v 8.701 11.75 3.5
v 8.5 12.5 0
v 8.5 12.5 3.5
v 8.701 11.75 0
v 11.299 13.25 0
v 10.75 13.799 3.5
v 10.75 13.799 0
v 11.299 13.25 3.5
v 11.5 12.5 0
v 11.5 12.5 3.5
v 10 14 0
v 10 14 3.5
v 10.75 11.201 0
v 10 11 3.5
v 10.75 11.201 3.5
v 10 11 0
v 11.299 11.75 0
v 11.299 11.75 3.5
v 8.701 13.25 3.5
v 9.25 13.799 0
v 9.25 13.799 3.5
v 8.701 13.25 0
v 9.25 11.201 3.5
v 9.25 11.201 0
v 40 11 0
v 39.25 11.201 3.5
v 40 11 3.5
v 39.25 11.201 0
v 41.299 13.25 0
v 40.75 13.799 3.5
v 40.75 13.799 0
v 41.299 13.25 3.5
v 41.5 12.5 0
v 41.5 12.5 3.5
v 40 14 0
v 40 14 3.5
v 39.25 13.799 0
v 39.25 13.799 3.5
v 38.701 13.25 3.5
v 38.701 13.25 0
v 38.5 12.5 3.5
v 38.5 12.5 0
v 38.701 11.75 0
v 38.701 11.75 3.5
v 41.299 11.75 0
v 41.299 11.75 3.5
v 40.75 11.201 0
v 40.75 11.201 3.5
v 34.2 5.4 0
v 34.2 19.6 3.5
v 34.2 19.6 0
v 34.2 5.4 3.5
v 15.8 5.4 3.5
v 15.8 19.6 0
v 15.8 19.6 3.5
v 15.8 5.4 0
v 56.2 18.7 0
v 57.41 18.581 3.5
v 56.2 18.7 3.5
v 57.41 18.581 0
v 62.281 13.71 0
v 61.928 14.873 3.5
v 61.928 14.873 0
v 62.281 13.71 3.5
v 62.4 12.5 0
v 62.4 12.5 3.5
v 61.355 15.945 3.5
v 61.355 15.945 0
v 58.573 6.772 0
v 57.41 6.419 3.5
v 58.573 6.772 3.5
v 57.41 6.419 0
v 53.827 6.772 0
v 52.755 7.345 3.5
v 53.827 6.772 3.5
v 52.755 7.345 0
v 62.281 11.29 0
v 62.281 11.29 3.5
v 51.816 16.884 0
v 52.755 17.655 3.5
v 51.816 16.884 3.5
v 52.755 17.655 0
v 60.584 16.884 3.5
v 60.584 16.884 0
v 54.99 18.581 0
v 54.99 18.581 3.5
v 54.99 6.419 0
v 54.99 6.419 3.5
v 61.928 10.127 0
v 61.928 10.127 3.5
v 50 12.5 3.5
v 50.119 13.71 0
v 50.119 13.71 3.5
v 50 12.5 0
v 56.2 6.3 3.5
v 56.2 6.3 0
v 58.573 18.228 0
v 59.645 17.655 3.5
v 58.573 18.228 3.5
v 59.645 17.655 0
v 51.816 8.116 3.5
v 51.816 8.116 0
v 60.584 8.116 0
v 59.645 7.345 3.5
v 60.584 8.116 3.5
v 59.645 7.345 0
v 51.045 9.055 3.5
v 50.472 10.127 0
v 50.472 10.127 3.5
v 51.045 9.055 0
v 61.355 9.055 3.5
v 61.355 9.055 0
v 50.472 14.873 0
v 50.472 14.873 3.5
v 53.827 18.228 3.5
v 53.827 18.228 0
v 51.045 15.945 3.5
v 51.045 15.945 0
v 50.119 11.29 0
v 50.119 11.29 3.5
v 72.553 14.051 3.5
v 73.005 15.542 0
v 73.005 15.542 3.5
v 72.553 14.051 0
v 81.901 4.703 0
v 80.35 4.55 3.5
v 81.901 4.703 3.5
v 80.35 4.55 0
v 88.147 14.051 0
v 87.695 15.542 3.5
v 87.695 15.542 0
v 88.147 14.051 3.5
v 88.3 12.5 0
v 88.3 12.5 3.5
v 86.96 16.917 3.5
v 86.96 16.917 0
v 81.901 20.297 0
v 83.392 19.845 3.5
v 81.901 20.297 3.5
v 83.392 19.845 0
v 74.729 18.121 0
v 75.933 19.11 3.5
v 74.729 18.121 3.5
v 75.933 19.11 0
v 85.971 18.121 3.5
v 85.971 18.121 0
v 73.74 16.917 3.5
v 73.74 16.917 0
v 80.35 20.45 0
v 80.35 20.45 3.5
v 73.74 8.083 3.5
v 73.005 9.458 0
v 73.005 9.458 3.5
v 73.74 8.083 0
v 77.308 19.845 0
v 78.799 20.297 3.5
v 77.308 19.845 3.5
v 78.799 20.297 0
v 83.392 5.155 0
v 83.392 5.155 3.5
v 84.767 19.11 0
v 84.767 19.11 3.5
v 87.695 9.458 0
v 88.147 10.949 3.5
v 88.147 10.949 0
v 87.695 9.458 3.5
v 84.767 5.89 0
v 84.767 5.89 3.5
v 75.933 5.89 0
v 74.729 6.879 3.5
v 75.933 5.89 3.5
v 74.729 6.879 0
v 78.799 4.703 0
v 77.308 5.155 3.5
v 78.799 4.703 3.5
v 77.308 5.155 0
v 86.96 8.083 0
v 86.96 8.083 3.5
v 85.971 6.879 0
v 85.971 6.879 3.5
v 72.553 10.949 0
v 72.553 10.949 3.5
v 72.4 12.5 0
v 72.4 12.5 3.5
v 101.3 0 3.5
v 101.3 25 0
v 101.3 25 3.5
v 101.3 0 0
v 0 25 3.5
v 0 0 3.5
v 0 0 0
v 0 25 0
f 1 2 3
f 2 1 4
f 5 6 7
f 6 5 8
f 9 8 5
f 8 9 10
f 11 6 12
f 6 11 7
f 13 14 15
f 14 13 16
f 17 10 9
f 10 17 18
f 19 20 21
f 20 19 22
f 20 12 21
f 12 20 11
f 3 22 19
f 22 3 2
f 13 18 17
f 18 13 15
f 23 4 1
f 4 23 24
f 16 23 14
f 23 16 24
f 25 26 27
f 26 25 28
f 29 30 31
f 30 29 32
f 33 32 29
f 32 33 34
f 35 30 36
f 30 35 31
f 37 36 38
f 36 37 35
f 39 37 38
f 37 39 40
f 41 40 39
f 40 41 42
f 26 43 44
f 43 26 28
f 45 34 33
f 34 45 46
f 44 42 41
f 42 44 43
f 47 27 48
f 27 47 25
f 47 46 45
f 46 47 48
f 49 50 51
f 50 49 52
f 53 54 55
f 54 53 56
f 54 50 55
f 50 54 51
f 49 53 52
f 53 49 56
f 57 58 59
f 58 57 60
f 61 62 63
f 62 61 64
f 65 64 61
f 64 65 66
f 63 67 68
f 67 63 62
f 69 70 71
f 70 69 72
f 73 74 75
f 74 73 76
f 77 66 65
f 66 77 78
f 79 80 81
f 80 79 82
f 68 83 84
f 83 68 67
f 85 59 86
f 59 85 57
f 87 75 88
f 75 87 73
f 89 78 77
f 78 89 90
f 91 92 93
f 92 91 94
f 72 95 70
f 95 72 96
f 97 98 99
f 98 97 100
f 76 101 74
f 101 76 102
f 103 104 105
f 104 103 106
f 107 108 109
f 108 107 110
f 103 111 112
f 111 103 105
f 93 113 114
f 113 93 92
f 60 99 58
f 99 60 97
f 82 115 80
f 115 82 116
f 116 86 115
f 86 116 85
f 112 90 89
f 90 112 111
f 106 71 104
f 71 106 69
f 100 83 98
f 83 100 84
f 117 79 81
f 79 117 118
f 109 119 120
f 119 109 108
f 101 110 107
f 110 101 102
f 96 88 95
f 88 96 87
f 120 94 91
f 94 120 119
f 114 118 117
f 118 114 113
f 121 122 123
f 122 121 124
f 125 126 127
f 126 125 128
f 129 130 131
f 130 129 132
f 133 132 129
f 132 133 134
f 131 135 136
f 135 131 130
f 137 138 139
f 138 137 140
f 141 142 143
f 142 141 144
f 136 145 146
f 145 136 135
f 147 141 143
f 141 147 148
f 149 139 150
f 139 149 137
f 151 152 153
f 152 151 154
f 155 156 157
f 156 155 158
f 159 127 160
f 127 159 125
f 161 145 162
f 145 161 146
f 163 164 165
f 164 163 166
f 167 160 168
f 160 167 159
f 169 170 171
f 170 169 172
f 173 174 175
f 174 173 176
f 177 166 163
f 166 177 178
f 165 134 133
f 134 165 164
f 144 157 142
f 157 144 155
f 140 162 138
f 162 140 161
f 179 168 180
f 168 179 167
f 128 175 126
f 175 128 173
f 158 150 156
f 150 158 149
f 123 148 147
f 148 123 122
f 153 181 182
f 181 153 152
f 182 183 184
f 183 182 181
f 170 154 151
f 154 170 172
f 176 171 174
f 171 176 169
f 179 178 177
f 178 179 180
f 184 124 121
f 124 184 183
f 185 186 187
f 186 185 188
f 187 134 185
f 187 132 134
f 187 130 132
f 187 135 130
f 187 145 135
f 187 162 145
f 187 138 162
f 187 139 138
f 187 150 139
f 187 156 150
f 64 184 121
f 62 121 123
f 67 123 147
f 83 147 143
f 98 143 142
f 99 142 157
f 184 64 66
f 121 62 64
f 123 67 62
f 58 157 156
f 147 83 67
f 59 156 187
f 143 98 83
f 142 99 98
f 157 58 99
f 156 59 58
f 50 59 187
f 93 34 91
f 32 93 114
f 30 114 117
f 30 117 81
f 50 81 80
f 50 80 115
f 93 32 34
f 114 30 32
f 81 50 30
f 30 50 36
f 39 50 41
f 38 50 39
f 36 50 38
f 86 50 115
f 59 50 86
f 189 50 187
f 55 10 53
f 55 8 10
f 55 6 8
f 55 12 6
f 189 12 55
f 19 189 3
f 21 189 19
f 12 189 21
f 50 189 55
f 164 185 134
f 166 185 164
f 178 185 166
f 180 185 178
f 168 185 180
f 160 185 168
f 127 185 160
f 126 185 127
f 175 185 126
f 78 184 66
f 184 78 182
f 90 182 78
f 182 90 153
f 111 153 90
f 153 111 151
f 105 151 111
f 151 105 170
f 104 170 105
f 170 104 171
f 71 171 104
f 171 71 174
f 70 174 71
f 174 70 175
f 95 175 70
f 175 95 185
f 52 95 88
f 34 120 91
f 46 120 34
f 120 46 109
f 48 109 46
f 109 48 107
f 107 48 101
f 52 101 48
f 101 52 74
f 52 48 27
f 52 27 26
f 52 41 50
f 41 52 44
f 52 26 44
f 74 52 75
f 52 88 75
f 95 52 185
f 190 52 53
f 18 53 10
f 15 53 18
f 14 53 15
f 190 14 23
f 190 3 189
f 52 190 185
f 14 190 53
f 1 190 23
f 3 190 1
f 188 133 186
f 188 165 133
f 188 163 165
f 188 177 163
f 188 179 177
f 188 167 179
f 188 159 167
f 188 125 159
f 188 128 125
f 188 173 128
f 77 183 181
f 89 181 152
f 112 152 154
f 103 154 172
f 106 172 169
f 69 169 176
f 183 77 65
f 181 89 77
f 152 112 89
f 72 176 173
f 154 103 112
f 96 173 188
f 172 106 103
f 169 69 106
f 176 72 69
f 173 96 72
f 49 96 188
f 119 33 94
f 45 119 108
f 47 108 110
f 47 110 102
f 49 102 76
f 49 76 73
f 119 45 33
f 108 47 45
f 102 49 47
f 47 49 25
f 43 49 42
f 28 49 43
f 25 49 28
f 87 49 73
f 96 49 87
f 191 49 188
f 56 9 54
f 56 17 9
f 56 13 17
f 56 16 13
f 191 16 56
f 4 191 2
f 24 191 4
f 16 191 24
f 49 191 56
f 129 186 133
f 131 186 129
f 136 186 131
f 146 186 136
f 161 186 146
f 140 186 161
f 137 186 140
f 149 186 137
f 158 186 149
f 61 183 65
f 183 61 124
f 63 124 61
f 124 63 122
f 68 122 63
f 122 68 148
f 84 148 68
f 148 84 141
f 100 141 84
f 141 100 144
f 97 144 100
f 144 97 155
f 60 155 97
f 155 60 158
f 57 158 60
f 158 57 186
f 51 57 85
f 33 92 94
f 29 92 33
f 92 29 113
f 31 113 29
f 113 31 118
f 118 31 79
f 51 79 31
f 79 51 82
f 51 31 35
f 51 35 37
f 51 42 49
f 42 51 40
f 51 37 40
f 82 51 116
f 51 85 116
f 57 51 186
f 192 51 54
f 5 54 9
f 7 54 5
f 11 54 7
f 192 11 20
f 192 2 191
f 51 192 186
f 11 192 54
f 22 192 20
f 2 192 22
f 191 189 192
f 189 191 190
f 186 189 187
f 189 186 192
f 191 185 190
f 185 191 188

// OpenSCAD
button_dia = 15.9;
power_dia = 12.4;
usb_screw_dia = 3;
usb_screw_dist = 30;
usb_height = 14.2;
usb_width = 18.4;

spacing = 10;
width = spacing*4+usb_screw_dist+usb_screw_dia+power_dia+button_dia;
height = 25;
thickness = 3.5;

module panel(){
	difference(){
		cube([width, height, thickness]);
		translate([spacing, height/2, 0]){
			//USB
			cylinder(r=usb_screw_dia/2, h=thickness*3, center=true, $fn=12);
			translate([usb_screw_dist, 0, 0])
				cylinder(r=usb_screw_dia/2, h=thickness*3, center=true, $fn=12);
			translate([usb_screw_dist/2, 0, 0])
				cube(size=[usb_width, usb_height, thickness*3], center=true);
			
			//barrel jack
			translate([usb_screw_dist+spacing+(power_dia/2), 0, 0])
				cylinder(r = power_dia/2, h=thickness*3, $fn=32, center=true);

			//power button
			translate([usb_screw_dist+spacing*2+(power_dia)+(button_dia/2), 0, 0])
				cylinder(r = button_dia/2, h=thickness*3, $fn=32, center=true);
		}
	}
}

panel();
